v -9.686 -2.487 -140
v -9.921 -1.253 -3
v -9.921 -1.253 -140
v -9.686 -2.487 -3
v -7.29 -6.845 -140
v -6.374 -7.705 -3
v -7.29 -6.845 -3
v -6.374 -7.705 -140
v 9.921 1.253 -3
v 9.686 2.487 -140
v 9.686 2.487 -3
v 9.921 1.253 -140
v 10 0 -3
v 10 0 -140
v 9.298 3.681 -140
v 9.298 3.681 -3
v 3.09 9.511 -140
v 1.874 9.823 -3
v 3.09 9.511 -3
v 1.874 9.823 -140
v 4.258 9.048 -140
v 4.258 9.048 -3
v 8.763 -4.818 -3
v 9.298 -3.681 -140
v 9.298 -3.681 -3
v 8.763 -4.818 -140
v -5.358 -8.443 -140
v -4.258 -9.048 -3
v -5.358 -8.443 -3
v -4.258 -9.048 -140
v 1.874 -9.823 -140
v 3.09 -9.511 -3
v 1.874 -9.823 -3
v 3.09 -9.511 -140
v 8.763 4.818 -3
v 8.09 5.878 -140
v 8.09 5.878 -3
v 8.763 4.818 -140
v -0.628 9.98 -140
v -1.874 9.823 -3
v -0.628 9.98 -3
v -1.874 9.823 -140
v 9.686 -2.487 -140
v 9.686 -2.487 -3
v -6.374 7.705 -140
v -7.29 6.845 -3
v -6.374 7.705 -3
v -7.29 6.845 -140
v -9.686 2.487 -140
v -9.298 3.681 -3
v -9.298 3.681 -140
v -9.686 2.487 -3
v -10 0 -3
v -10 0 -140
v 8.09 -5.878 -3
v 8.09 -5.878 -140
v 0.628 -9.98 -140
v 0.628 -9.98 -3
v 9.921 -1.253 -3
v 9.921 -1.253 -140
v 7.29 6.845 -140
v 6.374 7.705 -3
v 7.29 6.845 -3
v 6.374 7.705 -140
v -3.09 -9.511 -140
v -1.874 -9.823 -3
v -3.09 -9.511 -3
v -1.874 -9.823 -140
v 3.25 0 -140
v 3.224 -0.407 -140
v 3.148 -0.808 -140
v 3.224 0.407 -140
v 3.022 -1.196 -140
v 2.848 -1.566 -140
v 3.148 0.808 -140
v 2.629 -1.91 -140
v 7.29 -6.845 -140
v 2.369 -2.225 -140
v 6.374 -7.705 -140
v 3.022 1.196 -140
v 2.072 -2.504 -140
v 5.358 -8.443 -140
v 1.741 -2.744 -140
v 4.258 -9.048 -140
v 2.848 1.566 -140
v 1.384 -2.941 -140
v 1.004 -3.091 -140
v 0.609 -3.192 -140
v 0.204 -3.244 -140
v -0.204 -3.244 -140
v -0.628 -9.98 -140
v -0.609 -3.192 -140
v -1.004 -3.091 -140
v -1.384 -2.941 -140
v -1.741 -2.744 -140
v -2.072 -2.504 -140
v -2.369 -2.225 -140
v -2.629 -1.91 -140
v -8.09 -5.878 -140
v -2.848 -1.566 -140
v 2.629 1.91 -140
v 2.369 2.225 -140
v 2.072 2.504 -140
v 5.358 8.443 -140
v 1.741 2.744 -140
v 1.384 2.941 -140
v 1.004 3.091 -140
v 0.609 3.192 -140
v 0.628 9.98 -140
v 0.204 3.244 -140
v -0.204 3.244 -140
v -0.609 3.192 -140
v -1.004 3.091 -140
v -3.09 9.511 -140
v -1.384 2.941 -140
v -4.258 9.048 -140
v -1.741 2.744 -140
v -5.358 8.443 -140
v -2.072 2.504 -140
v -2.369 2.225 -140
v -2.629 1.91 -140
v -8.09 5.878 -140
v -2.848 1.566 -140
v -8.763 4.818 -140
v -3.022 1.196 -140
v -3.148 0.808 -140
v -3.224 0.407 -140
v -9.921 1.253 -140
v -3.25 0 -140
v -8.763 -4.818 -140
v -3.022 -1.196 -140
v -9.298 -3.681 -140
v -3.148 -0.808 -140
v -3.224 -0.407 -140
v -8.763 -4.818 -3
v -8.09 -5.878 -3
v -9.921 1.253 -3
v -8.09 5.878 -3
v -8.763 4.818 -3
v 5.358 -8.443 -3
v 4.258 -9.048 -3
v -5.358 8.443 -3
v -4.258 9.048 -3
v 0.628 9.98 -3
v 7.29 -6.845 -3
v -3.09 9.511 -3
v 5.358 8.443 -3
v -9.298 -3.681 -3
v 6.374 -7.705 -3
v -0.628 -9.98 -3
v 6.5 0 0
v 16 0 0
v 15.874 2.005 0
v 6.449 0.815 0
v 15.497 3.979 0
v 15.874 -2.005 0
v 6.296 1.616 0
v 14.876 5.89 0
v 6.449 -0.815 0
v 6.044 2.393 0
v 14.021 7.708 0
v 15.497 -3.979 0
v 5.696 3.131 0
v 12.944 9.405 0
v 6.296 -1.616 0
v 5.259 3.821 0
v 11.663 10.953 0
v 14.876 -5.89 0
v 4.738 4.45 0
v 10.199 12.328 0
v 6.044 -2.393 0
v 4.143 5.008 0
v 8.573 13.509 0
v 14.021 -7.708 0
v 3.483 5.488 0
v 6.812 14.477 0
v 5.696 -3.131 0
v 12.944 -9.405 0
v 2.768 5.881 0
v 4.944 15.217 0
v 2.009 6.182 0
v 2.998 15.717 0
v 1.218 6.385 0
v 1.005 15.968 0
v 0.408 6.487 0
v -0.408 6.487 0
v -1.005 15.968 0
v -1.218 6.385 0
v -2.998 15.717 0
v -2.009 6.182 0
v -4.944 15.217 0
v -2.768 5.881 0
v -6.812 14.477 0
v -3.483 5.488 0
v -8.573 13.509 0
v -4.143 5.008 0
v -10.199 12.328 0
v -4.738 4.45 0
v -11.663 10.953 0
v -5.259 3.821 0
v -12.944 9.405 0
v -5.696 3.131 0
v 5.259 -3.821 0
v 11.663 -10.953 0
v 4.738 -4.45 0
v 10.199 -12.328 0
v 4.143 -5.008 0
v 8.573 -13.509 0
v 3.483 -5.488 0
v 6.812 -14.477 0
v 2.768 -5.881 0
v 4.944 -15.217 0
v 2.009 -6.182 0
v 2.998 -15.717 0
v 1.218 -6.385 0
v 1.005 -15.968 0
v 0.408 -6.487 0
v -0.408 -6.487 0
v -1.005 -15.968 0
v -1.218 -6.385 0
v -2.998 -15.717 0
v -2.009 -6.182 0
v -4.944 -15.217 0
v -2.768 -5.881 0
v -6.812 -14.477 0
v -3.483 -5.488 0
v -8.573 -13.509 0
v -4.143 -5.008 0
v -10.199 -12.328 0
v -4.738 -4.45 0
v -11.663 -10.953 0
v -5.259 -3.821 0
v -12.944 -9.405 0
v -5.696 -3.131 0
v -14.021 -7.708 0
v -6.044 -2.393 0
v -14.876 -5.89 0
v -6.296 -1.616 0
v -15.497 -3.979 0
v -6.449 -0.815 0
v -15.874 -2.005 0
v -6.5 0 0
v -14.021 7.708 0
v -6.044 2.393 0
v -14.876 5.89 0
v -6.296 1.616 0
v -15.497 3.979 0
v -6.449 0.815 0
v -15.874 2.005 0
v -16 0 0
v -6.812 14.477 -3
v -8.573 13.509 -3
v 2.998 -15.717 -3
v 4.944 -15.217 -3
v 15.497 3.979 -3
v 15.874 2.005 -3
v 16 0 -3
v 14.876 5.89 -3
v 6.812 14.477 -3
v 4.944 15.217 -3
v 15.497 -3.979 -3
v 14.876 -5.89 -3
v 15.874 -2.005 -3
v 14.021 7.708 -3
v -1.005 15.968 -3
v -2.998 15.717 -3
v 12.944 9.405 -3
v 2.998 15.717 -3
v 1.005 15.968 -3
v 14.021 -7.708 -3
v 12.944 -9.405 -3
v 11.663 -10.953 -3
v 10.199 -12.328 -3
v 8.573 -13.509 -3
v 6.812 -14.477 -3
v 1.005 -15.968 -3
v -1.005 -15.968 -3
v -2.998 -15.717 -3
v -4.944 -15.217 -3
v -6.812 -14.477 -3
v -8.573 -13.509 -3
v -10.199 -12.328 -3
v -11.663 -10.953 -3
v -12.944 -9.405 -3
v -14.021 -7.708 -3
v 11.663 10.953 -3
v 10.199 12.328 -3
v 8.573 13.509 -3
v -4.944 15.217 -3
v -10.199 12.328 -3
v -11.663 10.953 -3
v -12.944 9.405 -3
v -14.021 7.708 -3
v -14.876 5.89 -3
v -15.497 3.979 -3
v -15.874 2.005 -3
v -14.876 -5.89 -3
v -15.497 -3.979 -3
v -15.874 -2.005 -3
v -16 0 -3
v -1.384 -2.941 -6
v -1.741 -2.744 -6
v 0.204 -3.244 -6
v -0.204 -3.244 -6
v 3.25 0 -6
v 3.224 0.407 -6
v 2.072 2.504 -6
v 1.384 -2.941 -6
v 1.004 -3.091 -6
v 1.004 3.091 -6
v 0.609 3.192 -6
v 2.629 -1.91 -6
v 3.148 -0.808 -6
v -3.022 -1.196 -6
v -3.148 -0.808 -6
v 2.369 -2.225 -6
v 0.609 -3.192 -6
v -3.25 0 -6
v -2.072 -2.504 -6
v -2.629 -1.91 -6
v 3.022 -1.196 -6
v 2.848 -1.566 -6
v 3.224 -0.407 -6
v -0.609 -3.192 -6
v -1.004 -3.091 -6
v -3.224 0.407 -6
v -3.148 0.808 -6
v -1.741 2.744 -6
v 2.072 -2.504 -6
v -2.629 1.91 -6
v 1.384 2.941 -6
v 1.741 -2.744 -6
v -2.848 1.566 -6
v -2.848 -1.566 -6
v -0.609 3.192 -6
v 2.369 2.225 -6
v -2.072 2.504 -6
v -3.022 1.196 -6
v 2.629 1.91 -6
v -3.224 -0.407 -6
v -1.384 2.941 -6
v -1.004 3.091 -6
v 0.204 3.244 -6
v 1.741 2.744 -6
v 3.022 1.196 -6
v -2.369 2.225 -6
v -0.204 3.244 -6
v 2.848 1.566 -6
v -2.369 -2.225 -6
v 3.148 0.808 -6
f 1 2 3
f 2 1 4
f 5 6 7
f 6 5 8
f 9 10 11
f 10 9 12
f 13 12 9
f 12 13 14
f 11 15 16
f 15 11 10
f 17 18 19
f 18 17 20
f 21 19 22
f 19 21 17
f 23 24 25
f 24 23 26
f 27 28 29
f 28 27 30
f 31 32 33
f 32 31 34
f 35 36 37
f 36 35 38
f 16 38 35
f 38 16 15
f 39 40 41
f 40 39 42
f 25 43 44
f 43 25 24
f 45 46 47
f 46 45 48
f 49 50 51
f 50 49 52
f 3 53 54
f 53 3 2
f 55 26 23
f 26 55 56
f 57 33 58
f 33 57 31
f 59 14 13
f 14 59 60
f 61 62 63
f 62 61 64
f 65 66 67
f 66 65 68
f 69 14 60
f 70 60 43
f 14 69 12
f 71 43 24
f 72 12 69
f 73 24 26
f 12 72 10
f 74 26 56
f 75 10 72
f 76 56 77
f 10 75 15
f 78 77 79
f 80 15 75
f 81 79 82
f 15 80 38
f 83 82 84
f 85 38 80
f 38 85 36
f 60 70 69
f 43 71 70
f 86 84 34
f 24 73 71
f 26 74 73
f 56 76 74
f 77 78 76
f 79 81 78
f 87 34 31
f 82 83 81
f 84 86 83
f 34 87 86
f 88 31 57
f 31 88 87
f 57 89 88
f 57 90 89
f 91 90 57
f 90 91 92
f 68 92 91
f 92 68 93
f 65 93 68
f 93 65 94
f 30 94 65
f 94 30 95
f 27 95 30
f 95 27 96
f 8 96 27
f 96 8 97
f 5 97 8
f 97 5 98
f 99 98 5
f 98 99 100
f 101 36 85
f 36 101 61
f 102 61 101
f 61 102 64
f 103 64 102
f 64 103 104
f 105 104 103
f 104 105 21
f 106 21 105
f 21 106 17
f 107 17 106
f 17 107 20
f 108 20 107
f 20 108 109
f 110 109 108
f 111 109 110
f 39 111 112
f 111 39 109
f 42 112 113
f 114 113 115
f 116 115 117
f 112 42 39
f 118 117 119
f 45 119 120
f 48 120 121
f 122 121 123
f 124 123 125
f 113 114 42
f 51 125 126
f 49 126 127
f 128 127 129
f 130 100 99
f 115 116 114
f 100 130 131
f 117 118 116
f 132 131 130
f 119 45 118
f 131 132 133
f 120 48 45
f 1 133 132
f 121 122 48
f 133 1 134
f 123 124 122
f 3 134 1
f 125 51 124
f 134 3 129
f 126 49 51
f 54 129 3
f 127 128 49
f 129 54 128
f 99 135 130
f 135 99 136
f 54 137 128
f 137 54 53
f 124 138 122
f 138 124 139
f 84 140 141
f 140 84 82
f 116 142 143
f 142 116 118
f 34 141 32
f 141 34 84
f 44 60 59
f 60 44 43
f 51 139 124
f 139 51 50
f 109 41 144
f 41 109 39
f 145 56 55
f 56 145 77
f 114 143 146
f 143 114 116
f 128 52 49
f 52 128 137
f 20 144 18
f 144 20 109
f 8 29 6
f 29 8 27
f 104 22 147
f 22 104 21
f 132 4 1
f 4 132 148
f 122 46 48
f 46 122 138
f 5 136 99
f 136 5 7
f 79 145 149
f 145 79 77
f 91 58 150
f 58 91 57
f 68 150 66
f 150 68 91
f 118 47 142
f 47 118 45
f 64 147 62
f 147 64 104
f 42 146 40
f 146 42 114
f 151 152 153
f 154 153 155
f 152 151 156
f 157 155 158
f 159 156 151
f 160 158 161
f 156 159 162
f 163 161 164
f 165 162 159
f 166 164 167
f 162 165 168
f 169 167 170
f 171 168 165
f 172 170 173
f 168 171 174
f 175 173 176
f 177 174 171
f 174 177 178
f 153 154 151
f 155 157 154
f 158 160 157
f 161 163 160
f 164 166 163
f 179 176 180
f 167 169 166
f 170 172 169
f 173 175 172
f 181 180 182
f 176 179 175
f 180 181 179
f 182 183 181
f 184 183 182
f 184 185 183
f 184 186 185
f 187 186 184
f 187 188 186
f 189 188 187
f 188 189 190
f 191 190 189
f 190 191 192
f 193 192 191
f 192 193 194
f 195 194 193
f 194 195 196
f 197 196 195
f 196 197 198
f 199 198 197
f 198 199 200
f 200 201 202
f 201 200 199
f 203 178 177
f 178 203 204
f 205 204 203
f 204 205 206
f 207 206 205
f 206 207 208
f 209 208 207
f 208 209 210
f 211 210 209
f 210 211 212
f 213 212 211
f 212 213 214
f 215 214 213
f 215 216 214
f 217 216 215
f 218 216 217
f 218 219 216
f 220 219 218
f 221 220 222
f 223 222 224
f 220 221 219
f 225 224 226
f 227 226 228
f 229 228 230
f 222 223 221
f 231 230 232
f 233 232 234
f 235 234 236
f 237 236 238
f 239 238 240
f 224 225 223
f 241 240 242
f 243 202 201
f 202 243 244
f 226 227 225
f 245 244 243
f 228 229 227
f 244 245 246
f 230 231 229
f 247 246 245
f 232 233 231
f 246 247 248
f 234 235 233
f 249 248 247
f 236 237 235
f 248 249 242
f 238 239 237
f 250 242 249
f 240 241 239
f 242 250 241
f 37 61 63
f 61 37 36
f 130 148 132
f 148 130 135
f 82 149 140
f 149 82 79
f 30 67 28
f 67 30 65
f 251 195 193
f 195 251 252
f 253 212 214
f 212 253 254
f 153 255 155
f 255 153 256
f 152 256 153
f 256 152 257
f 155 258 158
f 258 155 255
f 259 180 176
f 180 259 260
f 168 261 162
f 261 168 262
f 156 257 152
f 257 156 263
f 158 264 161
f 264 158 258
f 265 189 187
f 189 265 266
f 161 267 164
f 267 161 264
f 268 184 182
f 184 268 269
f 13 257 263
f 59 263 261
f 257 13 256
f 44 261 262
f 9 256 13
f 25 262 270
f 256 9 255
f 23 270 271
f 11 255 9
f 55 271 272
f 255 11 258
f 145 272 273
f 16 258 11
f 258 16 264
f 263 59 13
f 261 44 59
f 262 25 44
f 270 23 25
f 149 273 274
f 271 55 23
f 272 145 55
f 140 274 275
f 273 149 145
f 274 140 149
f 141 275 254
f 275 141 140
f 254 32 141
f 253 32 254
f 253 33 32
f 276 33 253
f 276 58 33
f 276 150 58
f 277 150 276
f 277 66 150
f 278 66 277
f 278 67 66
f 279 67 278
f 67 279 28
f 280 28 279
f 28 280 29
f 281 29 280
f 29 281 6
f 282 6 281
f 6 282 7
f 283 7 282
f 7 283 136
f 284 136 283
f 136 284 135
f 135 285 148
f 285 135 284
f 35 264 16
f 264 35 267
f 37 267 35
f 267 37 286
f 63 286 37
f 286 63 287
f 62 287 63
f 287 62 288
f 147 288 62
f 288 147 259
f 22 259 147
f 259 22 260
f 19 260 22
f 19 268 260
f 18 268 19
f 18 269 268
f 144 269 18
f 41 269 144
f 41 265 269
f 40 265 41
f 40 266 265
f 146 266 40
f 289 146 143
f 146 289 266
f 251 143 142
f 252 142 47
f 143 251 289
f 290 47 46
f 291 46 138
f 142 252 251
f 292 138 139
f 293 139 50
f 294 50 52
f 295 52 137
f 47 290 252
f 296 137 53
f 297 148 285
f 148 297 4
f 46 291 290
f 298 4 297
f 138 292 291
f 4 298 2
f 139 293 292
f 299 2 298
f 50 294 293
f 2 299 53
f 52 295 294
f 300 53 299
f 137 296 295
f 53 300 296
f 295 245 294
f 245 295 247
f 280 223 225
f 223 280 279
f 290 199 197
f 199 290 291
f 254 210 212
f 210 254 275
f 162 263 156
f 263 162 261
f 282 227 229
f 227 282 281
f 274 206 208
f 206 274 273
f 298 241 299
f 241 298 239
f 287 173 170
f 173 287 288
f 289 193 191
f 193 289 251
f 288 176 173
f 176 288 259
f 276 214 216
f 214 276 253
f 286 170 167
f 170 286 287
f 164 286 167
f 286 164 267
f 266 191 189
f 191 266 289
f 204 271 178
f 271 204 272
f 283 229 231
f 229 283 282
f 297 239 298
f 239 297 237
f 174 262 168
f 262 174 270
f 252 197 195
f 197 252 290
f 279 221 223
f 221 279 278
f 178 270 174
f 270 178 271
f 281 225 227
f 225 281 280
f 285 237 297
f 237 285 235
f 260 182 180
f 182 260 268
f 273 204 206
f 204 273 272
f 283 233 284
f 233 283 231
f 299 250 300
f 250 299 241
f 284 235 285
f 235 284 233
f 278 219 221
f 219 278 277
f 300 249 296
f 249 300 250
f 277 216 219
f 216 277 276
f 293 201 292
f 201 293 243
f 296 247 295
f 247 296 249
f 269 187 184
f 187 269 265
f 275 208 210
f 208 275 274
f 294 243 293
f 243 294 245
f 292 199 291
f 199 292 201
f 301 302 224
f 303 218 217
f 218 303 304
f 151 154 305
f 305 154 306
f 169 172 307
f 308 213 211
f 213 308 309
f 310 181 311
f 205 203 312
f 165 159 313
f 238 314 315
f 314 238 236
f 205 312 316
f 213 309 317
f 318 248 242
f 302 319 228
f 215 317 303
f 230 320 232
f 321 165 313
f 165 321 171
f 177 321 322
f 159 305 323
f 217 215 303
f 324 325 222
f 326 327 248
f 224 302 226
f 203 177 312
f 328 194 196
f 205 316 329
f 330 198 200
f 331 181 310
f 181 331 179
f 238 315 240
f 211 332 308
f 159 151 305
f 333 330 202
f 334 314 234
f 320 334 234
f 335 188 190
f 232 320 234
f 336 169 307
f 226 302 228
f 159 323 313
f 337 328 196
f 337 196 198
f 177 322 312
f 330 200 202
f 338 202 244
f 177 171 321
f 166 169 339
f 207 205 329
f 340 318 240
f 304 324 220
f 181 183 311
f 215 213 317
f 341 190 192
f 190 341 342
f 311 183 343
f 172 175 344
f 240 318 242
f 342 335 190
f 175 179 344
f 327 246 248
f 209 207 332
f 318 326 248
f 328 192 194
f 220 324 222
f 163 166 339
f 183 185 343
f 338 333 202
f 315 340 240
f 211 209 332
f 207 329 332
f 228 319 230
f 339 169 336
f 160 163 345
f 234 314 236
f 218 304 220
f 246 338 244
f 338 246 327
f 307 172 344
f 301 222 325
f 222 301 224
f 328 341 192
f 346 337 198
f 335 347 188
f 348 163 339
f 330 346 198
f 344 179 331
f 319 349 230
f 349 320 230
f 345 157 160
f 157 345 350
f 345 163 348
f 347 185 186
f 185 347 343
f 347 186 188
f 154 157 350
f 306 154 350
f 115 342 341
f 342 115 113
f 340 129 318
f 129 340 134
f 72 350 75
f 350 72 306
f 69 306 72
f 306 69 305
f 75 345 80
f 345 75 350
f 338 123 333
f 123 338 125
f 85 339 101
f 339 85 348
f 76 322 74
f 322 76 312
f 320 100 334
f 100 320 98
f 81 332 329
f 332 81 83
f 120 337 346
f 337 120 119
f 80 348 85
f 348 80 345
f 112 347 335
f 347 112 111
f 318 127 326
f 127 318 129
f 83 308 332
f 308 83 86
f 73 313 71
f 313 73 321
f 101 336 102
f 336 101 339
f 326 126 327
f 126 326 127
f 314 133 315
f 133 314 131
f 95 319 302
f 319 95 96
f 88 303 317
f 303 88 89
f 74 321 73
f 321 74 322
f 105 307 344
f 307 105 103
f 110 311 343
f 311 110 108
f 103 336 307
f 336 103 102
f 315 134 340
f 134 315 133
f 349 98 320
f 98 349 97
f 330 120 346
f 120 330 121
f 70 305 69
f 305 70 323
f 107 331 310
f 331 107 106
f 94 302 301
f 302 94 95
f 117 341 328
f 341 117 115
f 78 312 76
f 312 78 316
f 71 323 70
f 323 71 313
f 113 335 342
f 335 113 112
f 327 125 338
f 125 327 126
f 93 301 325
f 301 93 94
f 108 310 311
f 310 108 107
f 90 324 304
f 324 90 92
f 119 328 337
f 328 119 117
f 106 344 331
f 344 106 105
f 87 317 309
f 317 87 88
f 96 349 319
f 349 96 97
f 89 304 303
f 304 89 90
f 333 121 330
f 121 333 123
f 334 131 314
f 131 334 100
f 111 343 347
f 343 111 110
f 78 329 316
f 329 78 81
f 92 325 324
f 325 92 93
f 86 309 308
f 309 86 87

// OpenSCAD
$fn = 50;


difference() {
	union() {
		translate(v = [0, 0, -140.0000000000]) {
			cylinder(h = 140, r = 10.0000000000);
		}
		translate(v = [0, 0, -3.0000000000]) {
			cylinder(h = 3, r = 16.0000000000);
		}
	}
	union() {
		translate(v = [0, 0, 0]) {
			rotate(a = [0, 0, 0]) {
				difference() {
					union() {
						#translate(v = [0, 0, -140.0000000000]) {
							cylinder(h = 140, r = 2.2500000000);
						}
						#translate(v = [0, 0, -6]) {
							cylinder(h = 6, r = 10.0000000000, r1 = 3.2500000000, r2 = 6.5000000000);
						}
						#translate(v = [0, 0, -140.0000000000]) {
							cylinder(h = 140, r = 3.2500000000);
						}
						#translate(v = [0, 0, -140.0000000000]) {
							cylinder(h = 140, r = 2.2500000000);
						}
					}
					union();
				}
			}
		}
	}
}
